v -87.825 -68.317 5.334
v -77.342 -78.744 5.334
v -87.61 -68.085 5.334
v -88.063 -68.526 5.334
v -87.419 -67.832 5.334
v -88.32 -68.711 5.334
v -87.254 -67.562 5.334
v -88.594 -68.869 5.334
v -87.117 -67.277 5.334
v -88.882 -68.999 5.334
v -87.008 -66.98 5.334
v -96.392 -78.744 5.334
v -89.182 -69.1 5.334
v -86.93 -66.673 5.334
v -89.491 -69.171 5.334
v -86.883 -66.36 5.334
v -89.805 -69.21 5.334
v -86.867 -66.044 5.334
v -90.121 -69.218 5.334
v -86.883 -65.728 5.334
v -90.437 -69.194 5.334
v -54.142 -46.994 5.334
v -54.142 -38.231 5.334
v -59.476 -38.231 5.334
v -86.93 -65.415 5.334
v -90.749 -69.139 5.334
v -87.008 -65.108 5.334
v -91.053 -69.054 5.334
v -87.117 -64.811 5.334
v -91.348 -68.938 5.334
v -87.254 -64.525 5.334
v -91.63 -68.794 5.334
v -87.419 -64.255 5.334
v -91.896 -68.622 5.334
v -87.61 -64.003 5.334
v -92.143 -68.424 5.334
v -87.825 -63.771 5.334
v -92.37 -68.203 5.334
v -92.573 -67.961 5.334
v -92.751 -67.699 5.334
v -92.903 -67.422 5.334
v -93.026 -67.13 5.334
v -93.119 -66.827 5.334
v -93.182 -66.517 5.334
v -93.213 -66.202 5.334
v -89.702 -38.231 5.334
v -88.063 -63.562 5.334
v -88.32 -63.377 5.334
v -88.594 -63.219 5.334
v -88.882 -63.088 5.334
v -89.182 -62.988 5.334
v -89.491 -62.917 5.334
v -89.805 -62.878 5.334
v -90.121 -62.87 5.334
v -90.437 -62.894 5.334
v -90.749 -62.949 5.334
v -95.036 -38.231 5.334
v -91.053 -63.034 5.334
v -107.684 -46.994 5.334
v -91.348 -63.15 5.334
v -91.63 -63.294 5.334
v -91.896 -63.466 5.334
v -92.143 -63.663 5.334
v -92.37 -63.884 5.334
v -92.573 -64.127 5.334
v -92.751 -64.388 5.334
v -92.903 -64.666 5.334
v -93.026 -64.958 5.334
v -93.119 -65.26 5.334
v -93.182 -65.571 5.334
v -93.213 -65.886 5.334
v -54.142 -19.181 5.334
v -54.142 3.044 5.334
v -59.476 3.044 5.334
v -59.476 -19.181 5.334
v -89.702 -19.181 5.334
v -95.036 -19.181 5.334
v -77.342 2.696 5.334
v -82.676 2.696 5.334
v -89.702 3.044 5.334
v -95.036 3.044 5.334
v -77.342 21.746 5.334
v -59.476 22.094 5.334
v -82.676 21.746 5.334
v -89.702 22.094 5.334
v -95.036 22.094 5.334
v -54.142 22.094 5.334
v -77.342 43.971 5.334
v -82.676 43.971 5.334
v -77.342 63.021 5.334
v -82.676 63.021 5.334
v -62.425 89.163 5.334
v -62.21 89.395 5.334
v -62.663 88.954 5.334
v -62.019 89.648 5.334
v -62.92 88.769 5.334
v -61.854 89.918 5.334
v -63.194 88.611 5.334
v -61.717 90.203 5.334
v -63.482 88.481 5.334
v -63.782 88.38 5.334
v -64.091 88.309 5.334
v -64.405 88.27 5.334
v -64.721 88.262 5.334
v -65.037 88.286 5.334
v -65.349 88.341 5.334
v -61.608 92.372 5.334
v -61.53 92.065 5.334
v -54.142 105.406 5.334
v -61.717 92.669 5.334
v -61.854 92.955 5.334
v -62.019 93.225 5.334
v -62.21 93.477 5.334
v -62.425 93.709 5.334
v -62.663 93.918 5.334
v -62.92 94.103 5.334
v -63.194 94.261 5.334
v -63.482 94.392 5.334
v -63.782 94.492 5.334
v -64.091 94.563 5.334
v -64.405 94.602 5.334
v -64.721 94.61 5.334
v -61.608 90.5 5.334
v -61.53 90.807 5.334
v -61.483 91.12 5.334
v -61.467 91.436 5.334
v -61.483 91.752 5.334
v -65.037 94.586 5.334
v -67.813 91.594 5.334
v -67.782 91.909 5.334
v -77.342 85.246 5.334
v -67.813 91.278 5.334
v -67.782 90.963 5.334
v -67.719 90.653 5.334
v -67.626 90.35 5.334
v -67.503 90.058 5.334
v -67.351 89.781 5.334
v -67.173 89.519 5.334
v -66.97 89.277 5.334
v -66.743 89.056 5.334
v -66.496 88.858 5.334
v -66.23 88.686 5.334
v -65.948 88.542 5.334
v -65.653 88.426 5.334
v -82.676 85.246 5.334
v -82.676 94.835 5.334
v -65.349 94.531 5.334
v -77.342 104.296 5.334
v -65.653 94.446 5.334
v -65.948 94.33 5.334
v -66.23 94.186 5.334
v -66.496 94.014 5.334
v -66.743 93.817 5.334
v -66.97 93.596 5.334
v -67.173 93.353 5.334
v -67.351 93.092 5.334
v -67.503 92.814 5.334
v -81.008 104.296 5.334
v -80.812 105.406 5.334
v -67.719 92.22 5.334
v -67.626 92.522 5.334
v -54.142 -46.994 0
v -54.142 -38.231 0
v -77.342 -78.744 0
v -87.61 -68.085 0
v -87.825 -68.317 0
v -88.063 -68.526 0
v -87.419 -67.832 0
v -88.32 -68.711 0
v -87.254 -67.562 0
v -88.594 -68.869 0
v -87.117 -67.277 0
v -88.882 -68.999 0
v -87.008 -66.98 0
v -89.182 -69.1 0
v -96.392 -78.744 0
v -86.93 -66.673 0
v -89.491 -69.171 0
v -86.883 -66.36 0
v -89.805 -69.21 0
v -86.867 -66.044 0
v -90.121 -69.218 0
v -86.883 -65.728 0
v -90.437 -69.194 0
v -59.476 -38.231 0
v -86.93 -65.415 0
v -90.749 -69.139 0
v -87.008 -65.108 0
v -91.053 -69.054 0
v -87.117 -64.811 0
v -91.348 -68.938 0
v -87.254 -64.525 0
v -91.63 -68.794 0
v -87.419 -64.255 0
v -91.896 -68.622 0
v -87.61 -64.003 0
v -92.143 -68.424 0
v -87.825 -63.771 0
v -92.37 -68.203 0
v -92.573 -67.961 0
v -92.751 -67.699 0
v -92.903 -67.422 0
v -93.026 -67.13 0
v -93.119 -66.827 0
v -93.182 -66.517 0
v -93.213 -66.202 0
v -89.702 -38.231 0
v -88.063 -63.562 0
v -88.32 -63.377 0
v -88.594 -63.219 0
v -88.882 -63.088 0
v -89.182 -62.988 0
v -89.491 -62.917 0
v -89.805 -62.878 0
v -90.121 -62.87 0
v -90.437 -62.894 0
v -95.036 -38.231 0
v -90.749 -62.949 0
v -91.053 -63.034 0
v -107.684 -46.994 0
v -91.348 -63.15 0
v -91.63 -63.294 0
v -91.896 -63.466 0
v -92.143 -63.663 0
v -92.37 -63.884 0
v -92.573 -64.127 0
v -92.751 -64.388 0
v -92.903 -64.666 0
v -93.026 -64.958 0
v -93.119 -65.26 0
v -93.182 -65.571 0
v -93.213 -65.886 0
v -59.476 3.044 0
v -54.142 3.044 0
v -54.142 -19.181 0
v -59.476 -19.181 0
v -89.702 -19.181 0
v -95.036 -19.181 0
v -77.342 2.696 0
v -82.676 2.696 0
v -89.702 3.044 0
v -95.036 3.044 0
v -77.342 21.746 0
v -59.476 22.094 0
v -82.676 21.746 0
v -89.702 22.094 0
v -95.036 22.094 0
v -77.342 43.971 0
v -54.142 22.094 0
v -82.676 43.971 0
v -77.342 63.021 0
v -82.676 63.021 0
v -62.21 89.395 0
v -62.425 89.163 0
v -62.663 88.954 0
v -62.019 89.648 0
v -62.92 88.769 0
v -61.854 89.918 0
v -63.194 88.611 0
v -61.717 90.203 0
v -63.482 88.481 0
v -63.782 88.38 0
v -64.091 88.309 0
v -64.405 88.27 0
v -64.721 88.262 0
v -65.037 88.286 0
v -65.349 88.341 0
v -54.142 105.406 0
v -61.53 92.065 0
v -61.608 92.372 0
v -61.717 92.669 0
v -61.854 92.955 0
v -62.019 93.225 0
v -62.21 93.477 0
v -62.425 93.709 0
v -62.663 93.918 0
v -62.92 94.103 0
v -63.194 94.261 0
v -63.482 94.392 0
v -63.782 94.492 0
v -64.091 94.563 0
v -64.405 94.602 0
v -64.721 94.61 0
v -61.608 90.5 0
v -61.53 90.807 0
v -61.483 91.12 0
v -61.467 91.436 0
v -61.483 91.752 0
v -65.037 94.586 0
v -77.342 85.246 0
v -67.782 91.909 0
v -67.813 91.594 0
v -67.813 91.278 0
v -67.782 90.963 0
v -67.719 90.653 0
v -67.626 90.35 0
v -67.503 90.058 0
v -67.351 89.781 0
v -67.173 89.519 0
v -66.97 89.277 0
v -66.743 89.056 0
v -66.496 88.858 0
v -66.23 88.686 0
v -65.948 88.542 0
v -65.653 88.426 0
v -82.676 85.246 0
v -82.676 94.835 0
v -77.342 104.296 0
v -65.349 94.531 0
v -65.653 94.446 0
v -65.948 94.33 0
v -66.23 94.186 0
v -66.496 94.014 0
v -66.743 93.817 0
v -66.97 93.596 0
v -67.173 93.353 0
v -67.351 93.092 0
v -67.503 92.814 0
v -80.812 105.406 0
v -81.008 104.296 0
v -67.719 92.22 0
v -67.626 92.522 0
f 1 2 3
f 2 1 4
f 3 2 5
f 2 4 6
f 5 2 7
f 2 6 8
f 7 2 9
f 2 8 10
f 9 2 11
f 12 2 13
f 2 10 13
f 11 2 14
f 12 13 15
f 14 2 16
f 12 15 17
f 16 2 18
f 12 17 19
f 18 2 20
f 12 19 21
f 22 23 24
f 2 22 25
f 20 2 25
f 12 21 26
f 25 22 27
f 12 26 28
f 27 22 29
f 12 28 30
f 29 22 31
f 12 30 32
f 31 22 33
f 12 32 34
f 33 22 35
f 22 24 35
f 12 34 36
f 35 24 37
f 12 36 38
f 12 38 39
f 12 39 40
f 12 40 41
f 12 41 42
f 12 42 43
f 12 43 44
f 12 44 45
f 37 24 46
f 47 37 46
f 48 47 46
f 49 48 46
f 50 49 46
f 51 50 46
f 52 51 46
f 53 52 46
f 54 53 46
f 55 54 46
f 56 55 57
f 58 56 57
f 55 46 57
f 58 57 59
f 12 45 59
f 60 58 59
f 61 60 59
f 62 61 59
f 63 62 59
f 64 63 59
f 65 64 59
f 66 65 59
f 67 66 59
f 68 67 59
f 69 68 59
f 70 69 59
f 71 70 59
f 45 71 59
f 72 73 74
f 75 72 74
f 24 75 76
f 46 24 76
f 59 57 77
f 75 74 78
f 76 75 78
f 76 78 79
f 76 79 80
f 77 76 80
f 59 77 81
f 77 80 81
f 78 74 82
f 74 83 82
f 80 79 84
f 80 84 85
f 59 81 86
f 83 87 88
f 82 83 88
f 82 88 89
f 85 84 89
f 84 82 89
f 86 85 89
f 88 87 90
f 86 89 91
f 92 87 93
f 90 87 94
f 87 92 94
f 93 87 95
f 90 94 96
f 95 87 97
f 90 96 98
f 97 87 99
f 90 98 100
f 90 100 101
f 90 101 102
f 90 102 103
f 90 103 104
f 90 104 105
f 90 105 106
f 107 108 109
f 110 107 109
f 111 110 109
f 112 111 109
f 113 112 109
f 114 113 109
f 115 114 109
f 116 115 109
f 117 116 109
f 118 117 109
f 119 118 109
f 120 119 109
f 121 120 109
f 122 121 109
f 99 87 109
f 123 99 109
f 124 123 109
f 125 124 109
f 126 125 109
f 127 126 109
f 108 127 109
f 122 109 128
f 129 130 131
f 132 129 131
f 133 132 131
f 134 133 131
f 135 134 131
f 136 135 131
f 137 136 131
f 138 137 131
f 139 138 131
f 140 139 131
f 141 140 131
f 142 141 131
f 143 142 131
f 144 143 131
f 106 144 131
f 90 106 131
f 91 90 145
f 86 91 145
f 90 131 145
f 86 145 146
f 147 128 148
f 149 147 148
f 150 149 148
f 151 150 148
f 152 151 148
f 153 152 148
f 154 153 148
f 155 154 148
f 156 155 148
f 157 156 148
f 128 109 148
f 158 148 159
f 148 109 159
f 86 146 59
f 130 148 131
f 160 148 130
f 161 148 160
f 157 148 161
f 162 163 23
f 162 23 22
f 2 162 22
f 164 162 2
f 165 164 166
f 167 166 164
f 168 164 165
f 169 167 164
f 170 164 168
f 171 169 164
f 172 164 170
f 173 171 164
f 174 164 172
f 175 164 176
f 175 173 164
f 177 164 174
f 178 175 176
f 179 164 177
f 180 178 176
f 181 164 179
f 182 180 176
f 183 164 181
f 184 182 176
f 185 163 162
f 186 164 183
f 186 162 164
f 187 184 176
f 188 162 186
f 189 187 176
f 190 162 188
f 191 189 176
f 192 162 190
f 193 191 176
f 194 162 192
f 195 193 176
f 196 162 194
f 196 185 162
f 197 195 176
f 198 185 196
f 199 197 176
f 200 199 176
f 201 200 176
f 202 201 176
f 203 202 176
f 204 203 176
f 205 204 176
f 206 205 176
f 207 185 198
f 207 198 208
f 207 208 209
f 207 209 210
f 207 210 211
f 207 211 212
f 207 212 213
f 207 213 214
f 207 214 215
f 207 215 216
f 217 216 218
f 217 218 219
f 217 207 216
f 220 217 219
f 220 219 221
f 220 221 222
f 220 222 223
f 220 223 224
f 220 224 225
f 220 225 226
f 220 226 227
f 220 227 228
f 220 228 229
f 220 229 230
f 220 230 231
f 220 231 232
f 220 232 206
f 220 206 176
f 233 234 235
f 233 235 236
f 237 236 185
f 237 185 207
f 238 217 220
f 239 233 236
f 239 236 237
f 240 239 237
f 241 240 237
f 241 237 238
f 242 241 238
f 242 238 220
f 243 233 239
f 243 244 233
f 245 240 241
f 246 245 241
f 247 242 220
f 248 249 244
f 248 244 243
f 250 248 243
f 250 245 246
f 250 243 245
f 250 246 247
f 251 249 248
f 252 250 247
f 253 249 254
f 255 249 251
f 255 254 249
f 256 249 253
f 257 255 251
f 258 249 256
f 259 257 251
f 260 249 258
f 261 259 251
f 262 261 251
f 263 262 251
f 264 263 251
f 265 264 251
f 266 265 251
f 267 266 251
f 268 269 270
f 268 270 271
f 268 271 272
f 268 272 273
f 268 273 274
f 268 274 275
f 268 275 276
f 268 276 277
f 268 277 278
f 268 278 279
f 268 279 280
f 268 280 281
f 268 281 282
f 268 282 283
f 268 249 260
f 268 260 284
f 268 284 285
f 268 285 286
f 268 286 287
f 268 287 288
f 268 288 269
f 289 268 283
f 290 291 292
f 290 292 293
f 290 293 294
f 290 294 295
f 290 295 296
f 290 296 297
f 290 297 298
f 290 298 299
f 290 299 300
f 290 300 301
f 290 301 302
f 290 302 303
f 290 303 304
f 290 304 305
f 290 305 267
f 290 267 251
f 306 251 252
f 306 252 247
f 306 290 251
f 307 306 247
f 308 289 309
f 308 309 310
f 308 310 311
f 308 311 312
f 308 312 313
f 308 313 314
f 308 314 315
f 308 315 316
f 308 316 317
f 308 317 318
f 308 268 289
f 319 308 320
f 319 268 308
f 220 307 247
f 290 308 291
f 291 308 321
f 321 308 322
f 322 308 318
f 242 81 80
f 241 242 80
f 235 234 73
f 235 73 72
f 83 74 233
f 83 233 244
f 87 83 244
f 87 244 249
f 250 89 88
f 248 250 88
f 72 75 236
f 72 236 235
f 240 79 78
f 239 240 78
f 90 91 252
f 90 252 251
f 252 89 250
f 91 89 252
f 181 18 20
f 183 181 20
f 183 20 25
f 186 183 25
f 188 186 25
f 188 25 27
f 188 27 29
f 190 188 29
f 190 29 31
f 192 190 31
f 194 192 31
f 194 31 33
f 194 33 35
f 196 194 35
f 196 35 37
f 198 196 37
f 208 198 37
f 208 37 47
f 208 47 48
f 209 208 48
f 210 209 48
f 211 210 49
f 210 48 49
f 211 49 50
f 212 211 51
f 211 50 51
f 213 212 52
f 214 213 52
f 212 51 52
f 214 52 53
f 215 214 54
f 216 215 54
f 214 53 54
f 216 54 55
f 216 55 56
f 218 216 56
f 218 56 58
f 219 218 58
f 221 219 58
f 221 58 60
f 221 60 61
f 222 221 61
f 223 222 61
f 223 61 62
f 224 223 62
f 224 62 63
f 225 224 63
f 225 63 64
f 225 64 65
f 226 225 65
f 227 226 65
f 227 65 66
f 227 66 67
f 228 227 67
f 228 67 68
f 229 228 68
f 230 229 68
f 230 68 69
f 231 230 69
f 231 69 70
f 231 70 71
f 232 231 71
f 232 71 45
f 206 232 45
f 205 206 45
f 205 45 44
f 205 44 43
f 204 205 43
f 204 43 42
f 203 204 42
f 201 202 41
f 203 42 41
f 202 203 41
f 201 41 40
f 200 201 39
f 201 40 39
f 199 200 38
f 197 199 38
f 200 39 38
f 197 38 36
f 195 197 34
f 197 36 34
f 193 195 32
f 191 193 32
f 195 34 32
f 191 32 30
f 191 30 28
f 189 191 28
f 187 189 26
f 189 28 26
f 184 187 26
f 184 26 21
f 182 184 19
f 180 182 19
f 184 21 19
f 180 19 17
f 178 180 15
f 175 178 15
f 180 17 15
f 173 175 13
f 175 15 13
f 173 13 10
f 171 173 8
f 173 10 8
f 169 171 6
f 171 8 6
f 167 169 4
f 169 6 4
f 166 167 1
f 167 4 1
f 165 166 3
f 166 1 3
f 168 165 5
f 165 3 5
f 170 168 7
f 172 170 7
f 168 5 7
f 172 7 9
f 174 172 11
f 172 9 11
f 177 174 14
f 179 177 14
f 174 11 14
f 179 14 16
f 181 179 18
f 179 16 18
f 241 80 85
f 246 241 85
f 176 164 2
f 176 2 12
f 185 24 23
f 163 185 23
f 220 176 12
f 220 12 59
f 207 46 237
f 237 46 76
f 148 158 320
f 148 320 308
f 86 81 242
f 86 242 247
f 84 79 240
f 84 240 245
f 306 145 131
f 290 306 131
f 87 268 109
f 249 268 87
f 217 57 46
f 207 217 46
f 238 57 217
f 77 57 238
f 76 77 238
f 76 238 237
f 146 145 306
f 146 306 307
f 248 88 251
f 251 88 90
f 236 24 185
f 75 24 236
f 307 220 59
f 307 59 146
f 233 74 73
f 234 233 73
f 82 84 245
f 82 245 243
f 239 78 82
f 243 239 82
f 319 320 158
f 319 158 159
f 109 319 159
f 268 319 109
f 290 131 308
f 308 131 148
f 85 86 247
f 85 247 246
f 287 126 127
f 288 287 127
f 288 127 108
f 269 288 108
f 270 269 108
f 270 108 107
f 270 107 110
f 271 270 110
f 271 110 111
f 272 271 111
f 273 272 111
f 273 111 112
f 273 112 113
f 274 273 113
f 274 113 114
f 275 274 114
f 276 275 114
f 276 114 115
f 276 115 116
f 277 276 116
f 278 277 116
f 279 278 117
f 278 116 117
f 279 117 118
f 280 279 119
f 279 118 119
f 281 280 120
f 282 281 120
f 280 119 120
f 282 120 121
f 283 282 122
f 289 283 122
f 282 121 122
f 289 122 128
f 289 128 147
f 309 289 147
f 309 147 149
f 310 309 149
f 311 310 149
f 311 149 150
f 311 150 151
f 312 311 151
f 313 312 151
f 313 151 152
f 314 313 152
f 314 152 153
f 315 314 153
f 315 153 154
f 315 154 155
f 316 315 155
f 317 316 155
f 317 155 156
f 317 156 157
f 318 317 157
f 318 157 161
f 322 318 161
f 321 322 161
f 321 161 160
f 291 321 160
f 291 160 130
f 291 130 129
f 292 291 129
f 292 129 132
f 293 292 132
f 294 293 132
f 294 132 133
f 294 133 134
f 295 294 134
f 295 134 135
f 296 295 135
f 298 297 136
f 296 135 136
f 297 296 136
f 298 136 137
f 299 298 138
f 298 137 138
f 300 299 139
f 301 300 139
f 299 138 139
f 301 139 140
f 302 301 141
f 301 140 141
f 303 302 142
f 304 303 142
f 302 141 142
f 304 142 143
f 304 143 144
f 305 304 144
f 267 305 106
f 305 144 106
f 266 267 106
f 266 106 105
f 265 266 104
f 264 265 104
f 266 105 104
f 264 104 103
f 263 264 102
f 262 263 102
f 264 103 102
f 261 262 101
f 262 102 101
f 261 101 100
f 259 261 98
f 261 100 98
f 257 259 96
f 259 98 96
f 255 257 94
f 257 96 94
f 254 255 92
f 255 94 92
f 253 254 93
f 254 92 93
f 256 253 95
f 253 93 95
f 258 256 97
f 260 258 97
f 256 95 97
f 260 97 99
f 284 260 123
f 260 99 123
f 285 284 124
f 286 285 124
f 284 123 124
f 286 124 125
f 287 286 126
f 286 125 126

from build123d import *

# Parameters (mm, degrees)
BODYSHAPE_DEPTH      = 5.334
SKETCH2_W            = 5.334
SKETCH2_H            = 19.05
MOTORMOUNTCUTS_DEPTH = 151.780754949
SKETCH3_R            = 3.175
BOLTHOLES_DEPTH      = 151.780754949
SKETCH4_W            = 5.334
SKETCH4_H            = 19.05
CUT_EXTRUDE3_DEPTH   = 151.780754949


with BuildPart() as part:
    # Sketch1 → BodyShape (new body)
    with BuildSketch(Plane.XY):
        Polygon((-80.812244673, 105.406062542), (-54.142244673, 105.406062542), (-54.142244673, -46.993937458), (-77.342244755, -78.743937458), (-96.392244755, -78.743937458), (-107.684476533, -46.993937458), align=None)
    extrude(amount=BODYSHAPE_DEPTH)

    # Sketch2 → MotorMountCuts (cut, through all)
    with BuildSketch(Plane.XY.offset(5.334)):
        with Locations((-56.809244673, -28.705937458)):
            Rectangle(SKETCH2_W, SKETCH2_H)
        with Locations((-56.809244673, 12.569062542)):
            Rectangle(SKETCH2_W, SKETCH2_H)
        with Locations((-92.369244673, -28.705937458)):
            Rectangle(SKETCH2_W, SKETCH2_H)
        with Locations((-92.369244673, 12.569062542)):
            Rectangle(SKETCH2_W, SKETCH2_H)
    extrude(amount=-MOTORMOUNTCUTS_DEPTH, mode=Mode.SUBTRACT)

    # Sketch3 → BoltHoles (cut, through all)
    with BuildSketch(Plane.XY.offset(5.334)):
        with Locations((-90.042244755, -66.043937458)):
            Circle(SKETCH3_R)
        with Locations((-64.642244755, 91.436062542)):
            Circle(SKETCH3_R)
    extrude(amount=-BOLTHOLES_DEPTH, mode=Mode.SUBTRACT)

    # Sketch4 → Cut-Extrude3 (cut, through all)
    with BuildSketch(Plane.XY.offset(5.334)):
        with Locations((-80.009244755, 94.771037838)):
            Rectangle(SKETCH4_W, SKETCH4_H)
        with Locations((-80.009244755, 53.496037838)):
            Rectangle(SKETCH4_W, SKETCH4_H)
        with Locations((-80.009244755, 12.221037838)):
            Rectangle(SKETCH4_W, SKETCH4_H)
    extrude(amount=-CUT_EXTRUDE3_DEPTH, mode=Mode.SUBTRACT)


solid = part.part
